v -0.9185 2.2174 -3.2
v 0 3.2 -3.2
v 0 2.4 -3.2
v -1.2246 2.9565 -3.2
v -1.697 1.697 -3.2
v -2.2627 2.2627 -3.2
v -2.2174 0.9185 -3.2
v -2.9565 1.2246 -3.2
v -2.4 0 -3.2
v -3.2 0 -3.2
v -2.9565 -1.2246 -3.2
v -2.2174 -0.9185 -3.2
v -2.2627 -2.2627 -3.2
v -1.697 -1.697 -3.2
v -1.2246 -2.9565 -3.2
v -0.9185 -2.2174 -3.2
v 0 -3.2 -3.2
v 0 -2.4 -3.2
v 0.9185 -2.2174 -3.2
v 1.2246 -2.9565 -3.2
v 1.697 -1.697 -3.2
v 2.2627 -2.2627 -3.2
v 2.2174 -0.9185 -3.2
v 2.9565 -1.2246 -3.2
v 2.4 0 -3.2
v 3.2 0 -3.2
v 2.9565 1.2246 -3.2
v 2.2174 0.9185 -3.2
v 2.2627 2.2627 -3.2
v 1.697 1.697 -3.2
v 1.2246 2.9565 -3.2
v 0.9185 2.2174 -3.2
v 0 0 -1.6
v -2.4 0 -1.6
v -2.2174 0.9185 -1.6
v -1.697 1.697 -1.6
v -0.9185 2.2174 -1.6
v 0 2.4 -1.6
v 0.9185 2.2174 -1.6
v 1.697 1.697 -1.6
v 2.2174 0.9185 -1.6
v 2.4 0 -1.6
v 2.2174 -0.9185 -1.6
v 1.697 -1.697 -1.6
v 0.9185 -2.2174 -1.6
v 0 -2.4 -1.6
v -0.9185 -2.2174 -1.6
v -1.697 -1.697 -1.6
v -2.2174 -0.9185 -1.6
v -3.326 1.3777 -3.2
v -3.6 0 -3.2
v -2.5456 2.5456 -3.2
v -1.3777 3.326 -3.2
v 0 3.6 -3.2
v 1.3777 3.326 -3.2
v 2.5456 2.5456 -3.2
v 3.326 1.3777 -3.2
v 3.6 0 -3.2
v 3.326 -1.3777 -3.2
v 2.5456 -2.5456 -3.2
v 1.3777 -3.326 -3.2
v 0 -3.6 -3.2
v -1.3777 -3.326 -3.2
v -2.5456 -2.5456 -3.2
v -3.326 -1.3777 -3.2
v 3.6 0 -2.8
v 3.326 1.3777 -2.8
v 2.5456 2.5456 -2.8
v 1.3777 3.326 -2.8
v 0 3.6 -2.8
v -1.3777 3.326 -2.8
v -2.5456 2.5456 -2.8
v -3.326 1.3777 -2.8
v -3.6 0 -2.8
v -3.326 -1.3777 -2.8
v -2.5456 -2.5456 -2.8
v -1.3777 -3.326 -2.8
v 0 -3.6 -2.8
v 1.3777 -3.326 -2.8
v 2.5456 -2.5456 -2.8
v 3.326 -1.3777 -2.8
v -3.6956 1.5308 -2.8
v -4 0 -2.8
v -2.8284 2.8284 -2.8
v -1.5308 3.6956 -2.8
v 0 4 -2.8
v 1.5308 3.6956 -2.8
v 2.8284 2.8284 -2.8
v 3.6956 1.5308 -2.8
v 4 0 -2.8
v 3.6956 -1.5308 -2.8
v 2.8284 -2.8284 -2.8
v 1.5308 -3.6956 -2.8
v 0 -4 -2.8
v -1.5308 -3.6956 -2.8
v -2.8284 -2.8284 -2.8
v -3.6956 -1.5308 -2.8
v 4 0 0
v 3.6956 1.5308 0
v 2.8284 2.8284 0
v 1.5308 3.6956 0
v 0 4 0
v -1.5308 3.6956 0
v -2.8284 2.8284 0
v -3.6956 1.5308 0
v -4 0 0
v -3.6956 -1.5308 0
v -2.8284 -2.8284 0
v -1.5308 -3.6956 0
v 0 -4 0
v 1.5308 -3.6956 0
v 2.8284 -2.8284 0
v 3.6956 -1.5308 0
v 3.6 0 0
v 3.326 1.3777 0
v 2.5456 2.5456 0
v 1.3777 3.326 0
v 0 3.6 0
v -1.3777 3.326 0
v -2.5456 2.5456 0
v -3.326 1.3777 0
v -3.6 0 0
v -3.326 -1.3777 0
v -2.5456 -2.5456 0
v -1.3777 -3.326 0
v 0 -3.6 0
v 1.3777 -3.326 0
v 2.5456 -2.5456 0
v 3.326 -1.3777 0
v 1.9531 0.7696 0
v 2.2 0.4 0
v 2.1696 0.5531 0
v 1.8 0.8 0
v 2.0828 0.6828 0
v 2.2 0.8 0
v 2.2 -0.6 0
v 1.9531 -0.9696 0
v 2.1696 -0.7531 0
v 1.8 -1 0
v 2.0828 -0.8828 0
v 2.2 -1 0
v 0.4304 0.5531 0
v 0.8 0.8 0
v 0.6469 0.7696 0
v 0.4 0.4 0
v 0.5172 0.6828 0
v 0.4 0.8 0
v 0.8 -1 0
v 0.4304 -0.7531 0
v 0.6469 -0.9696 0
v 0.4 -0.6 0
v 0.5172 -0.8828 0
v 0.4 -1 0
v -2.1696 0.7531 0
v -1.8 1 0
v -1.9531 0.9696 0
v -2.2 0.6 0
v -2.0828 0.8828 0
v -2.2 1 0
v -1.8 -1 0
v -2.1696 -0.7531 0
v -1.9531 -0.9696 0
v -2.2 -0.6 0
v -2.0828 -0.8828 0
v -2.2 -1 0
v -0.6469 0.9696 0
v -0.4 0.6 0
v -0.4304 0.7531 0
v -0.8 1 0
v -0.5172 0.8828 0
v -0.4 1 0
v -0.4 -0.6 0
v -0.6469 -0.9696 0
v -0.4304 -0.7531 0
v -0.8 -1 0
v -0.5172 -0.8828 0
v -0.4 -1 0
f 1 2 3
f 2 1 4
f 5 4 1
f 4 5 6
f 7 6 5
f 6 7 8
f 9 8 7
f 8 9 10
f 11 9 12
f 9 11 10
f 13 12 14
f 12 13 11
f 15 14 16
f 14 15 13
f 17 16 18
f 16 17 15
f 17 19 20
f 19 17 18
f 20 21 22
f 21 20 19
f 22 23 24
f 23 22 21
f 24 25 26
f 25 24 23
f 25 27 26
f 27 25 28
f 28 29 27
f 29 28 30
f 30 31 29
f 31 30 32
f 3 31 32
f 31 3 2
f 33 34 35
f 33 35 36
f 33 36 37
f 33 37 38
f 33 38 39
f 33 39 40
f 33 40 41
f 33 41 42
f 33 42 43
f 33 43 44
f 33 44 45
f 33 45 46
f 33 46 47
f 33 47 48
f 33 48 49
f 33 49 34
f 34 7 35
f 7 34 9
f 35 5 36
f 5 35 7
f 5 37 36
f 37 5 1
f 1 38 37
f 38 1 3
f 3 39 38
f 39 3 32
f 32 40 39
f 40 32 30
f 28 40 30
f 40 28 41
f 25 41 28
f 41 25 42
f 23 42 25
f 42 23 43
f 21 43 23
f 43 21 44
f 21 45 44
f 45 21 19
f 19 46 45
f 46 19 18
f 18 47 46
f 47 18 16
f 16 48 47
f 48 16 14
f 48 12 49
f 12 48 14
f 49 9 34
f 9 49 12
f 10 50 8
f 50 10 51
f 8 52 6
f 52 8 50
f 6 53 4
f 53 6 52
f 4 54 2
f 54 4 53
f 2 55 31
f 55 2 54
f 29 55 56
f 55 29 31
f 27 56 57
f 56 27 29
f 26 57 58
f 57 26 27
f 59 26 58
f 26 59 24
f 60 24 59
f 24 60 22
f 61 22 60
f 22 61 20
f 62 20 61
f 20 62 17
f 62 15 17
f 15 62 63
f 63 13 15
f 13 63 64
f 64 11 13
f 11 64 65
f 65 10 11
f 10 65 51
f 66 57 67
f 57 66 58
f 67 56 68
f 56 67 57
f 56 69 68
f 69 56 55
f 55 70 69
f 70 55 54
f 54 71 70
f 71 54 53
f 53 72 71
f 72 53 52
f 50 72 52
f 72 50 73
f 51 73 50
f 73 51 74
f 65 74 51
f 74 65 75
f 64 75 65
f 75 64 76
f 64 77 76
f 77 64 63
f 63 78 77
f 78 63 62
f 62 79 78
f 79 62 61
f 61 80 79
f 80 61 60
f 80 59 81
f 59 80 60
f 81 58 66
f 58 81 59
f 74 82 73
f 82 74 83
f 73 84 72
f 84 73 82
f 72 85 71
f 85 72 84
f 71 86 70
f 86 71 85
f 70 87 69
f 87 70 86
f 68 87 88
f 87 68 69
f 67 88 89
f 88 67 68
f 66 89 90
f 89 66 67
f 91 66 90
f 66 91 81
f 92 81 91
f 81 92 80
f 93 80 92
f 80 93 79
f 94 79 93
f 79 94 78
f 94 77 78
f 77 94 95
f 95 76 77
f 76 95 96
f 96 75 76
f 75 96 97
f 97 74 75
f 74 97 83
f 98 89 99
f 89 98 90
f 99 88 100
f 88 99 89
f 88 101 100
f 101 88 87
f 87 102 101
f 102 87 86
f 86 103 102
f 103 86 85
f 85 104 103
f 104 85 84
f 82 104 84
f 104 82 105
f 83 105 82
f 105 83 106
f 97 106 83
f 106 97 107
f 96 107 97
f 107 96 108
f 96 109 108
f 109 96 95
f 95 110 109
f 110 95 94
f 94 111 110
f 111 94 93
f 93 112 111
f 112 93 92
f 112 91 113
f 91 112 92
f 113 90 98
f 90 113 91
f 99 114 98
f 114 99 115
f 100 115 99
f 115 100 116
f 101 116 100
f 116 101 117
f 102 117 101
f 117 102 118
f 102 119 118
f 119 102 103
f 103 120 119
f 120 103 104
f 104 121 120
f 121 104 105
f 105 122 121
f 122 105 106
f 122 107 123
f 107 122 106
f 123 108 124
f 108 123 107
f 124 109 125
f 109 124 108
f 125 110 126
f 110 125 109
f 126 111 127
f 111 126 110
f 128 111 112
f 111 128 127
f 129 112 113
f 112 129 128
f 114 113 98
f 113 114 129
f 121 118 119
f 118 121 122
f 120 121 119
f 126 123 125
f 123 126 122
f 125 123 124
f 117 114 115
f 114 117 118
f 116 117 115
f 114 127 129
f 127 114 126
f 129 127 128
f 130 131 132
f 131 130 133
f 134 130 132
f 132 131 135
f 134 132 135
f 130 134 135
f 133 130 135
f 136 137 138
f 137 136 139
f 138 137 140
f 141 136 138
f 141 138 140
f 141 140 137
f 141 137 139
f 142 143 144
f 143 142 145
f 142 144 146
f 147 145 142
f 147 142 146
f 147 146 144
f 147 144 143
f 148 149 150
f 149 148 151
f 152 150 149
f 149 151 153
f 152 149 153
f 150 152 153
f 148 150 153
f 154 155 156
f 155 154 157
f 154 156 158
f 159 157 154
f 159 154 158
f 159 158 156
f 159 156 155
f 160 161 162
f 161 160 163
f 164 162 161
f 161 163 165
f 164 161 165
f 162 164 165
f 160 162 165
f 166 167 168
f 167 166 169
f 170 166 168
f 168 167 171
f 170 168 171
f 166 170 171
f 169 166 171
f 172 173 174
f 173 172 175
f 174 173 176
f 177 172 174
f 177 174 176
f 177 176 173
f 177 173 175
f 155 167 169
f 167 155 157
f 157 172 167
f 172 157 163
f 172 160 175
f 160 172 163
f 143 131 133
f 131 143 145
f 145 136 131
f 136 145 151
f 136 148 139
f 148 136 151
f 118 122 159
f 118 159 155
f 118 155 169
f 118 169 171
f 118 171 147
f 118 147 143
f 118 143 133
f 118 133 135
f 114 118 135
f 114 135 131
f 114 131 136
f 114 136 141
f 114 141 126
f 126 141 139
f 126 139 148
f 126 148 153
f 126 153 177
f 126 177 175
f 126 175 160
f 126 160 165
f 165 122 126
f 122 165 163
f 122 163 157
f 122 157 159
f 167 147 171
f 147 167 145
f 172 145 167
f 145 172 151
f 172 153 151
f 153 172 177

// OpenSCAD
// file: ../p/4-4disc.scad
use <../lib.scad>
function ldraw_lib__4_4disc() = [
// 0 Disc 1.0
// 0 Name: 4-4disc.dat
// 0 Author: James Jessiman
// 0 !LDRAW_ORG Primitive UPDATE 2002-02
// 0 !LICENSE Licensed under CC BY 2.0 and CC BY 4.0 : see CAreadme.txt
// 
// 0 BFC CERTIFY CCW
  [0,"BFC","CERTIFY"],
  [0,"BFC","CCW"],
// 
// 0 !HISTORY 1998-12-15 [PTadmin] Official Update 1998-10
// 0 !HISTORY 2002-03-23 [sbliss] Added BFC statement
// 0 !HISTORY 2002-04-25 [PTadmin] Official Update 2002-02
// 0 !HISTORY 2007-06-24 [PTadmin] Header formatted for Contributor Agreement
// 0 !HISTORY 2008-07-01 [PTadmin] Official Update 2008-01
// 
// 
// 3 16 0 0 0 1 0 0 0.9239 0 0.3827
  [3,16,0,0,0,1,0,0,0.9239,0,0.3827],
// 3 16 0 0 0 0.9239 0 0.3827 0.7071 0 0.7071
  [3,16,0,0,0,0.9239,0,0.3827,0.7071,0,0.7071],
// 3 16 0 0 0 0.7071 0 0.7071 0.3827 0 0.9239
  [3,16,0,0,0,0.7071,0,0.7071,0.3827,0,0.9239],
// 3 16 0 0 0 0.3827 0 0.9239 0 0 1
  [3,16,0,0,0,0.3827,0,0.9239,0,0,1],
// 3 16 0 0 0 0 0 1 -0.3827 0 0.9239
  [3,16,0,0,0,0,0,1,-0.3827,0,0.9239],
// 3 16 0 0 0 -0.3827 0 0.9239 -0.7071 0 0.7071
  [3,16,0,0,0,-0.3827,0,0.9239,-0.7071,0,0.7071],
// 3 16 0 0 0 -0.7071 0 0.7071 -0.9239 0 0.3827
  [3,16,0,0,0,-0.7071,0,0.7071,-0.9239,0,0.3827],
// 3 16 0 0 0 -0.9239 0 0.3827 -1 0 -0
  [3,16,0,0,0,-0.9239,0,0.3827,-1,0,-0],
// 3 16 0 0 0 -1 0 -0 -0.9239 0 -0.3827
  [3,16,0,0,0,-1,0,-0,-0.9239,0,-0.3827],
// 3 16 0 0 0 -0.9239 0 -0.3827 -0.7071 0 -0.7071
  [3,16,0,0,0,-0.9239,0,-0.3827,-0.7071,0,-0.7071],
// 3 16 0 0 0 -0.7071 0 -0.7071 -0.3827 0 -0.9239
  [3,16,0,0,0,-0.7071,0,-0.7071,-0.3827,0,-0.9239],
// 3 16 0 0 0 -0.3827 0 -0.9239 0 0 -1
  [3,16,0,0,0,-0.3827,0,-0.9239,0,0,-1],
// 3 16 0 0 0 0 0 -1 0.3827 0 -0.9239
  [3,16,0,0,0,0,0,-1,0.3827,0,-0.9239],
// 3 16 0 0 0 0.3827 0 -0.9239 0.7071 0 -0.7071
  [3,16,0,0,0,0.3827,0,-0.9239,0.7071,0,-0.7071],
// 3 16 0 0 0 0.7071 0 -0.7071 0.9239 0 -0.3827
  [3,16,0,0,0,0.7071,0,-0.7071,0.9239,0,-0.3827],
// 3 16 0 0 0 0.9239 0 -0.3827 1 0 0
  [3,16,0,0,0,0.9239,0,-0.3827,1,0,0],
// 0
];
makepoly(ldraw_lib__4_4disc(), line=0.2);
// file: ../p/4-4ring3.scad
use <../lib.scad>
function ldraw_lib__4_4ring3() = [
// 0 Ring  3 x 1.0
// 0 Name: 4-4ring3.dat
// 0 Author: James Jessiman
// 0 !LDRAW_ORG Primitive UPDATE 2009-01
// 0 !LICENSE Licensed under CC BY 2.0 and CC BY 4.0 : see CAreadme.txt
// 
// 0 BFC CERTIFY CCW
  [0,"BFC","CERTIFY"],
  [0,"BFC","CCW"],
// 
// 0 !HISTORY 1998-12-15 [PTadmin] Official Update 1998-10
// 0 !HISTORY 2002-04-05 [hafhead] Added BFC statement
// 0 !HISTORY 2002-04-25 [PTadmin] Official Update 2002-02
// 0 !HISTORY 2007-06-24 [PTadmin] Header formatted for Contributor Agreement
// 0 !HISTORY 2008-07-01 [PTadmin] Official Update 2008-01
// 0 !HISTORY 2008-08-26 [cwdee] Switch polygon winding and rename
// 0 !HISTORY 2009-05-02 [PTadmin] Official Update 2009-01
// 
// 
// 4 16 -1.5308 0 3.6956 -1.1481 0 2.7717 0 0 3 0 0 4
  [4,16,-1.5308,0,3.6956,-1.1481,0,2.7717,0,0,3,0,0,4],
// 4 16 -2.8284 0 2.8284 -2.1213 0 2.1213 -1.1481 0 2.7717 -1.5308 0 3.6956
  [4,16,-2.8284,0,2.8284,-2.1213,0,2.1213,-1.1481,0,2.7717,-1.5308,0,3.6956],
// 4 16 -3.6956 0 1.5308 -2.7717 0 1.1481 -2.1213 0 2.1213 -2.8284 0 2.8284
  [4,16,-3.6956,0,1.5308,-2.7717,0,1.1481,-2.1213,0,2.1213,-2.8284,0,2.8284],
// 4 16 -4 0 0 -3 0 0 -2.7717 0 1.1481 -3.6956 0 1.5308
  [4,16,-4,0,0,-3,0,0,-2.7717,0,1.1481,-3.6956,0,1.5308],
// 4 16 -3.6956 0 -1.5308 -2.7717 0 -1.1481 -3 0 0 -4 0 0
  [4,16,-3.6956,0,-1.5308,-2.7717,0,-1.1481,-3,0,0,-4,0,0],
// 4 16 -2.8284 0 -2.8284 -2.1213 0 -2.1213 -2.7717 0 -1.1481 -3.6956 0 -1.5308
  [4,16,-2.8284,0,-2.8284,-2.1213,0,-2.1213,-2.7717,0,-1.1481,-3.6956,0,-1.5308],
// 4 16 -1.5308 0 -3.6956 -1.1481 0 -2.7717 -2.1213 0 -2.1213 -2.8284 0 -2.8284
  [4,16,-1.5308,0,-3.6956,-1.1481,0,-2.7717,-2.1213,0,-2.1213,-2.8284,0,-2.8284],
// 4 16 0 0 -4 0 0 -3 -1.1481 0 -2.7717 -1.5308 0 -3.6956
  [4,16,0,0,-4,0,0,-3,-1.1481,0,-2.7717,-1.5308,0,-3.6956],
// 4 16 1.5308 0 -3.6956 1.1481 0 -2.7717 0 0 -3 0 0 -4
  [4,16,1.5308,0,-3.6956,1.1481,0,-2.7717,0,0,-3,0,0,-4],
// 4 16 2.8284 0 -2.8284 2.1213 0 -2.1213 1.1481 0 -2.7717 1.5308 0 -3.6956
  [4,16,2.8284,0,-2.8284,2.1213,0,-2.1213,1.1481,0,-2.7717,1.5308,0,-3.6956],
// 4 16 3.6956 0 -1.5308 2.7717 0 -1.1481 2.1213 0 -2.1213 2.8284 0 -2.8284
  [4,16,3.6956,0,-1.5308,2.7717,0,-1.1481,2.1213,0,-2.1213,2.8284,0,-2.8284],
// 4 16 4 0 0 3 0 0 2.7717 0 -1.1481 3.6956 0 -1.5308
  [4,16,4,0,0,3,0,0,2.7717,0,-1.1481,3.6956,0,-1.5308],
// 4 16 3.6956 0 1.5308 2.7717 0 1.1481 3 0 0 4 0 0
  [4,16,3.6956,0,1.5308,2.7717,0,1.1481,3,0,0,4,0,0],
// 4 16 2.8284 0 2.8284 2.1213 0 2.1213 2.7717 0 1.1481 3.6956 0 1.5308
  [4,16,2.8284,0,2.8284,2.1213,0,2.1213,2.7717,0,1.1481,3.6956,0,1.5308],
// 4 16 1.5308 0 3.6956 1.1481 0 2.7717 2.1213 0 2.1213 2.8284 0 2.8284
  [4,16,1.5308,0,3.6956,1.1481,0,2.7717,2.1213,0,2.1213,2.8284,0,2.8284],
// 4 16 0 0 4 0 0 3 1.1481 0 2.7717 1.5308 0 3.6956
  [4,16,0,0,4,0,0,3,1.1481,0,2.7717,1.5308,0,3.6956],
// 0
];
makepoly(ldraw_lib__4_4ring3(), line=0.2);
// file: ../p/4-4cylc.scad
use <../lib.scad>
use <4-4cyli.scad>
use <4-4disc.scad>
use <4-4edge.scad>
function ldraw_lib__4_4cylc() = [
// 0 Cylinder Closed 1.0
// 0 Name: 4-4cylc.dat
// 0 Author: Alex Taylor [anathema]
// 0 !LDRAW_ORG Primitive UPDATE 2009-02
// 0 !LICENSE Licensed under CC BY 2.0 and CC BY 4.0 : see CAreadme.txt
// 
// 0 BFC CERTIFY CCW
  [0,"BFC","CERTIFY"],
  [0,"BFC","CCW"],
// 
// 0 !HISTORY 2008-12-29 [cwdee] Removed one disc
// 0 !HISTORY 2009-09-03 [PTadmin] Official Update 2009-02
// 
// 
// 1 16 0 0 0 1 0 0 0 1 0 0 0 1 4-4edge.dat
  [1,16,0,0,0,1,0,0,0,1,0,0,0,1, ldraw_lib__4_4edge()],
// 1 16 0 1 0 1 0 0 0 1 0 0 0 1 4-4edge.dat
  [1,16,0,1,0,1,0,0,0,1,0,0,0,1, ldraw_lib__4_4edge()],
// 1 16 0 0 0 1 0 0 0 1 0 0 0 1 4-4disc.dat
  [1,16,0,0,0,1,0,0,0,1,0,0,0,1, ldraw_lib__4_4disc()],
// 1 16 0 0 0 1 0 0 0 1 0 0 0 1 4-4cyli.dat
  [1,16,0,0,0,1,0,0,0,1,0,0,0,1, ldraw_lib__4_4cyli()],
// 0
];
makepoly(ldraw_lib__4_4cylc(), line=0.2);
// file: ../p/4-4edge.scad
use <../lib.scad>
function ldraw_lib__4_4edge() = [
// 0 Circle 1.0
// 0 Name: 4-4edge.dat
// 0 Author: James Jessiman
// 0 !LDRAW_ORG Primitive UPDATE 2017-01
// 0 !LICENSE Licensed under CC BY 2.0 and CC BY 4.0 : see CAreadme.txt
// 
// 0 BFC CERTIFY CCW
  [0,"BFC","CERTIFY"],
  [0,"BFC","CCW"],
// 
// 0 !HISTORY 1998-12-15 [PTadmin] Official Update 1998-10
// 0 !HISTORY 2005-12-28 [PTadmin] Official Update 2005-01
// 0 !HISTORY 2007-06-24 [PTadmin] Header formatted for Contributor Agreement
// 0 !HISTORY 2008-07-01 [PTadmin] Official Update 2008-01
// 0 !HISTORY 2017-01-15 [Steffen] BFCed
// 0 !HISTORY 2017-12-30 [PTadmin] Official Update 2017-01
// 
// 
// 2 24 1 0 0 0.9239 0 0.3827
  [2,24,1,0,0,0.9239,0,0.3827],
// 2 24 0.9239 0 0.3827 0.7071 0 0.7071
  [2,24,0.9239,0,0.3827,0.7071,0,0.7071],
// 2 24 0.7071 0 0.7071 0.3827 0 0.9239
  [2,24,0.7071,0,0.7071,0.3827,0,0.9239],
// 2 24 0.3827 0 0.9239 0 0 1
  [2,24,0.3827,0,0.9239,0,0,1],
// 2 24 0 0 1 -0.3827 0 0.9239
  [2,24,0,0,1,-0.3827,0,0.9239],
// 2 24 -0.3827 0 0.9239 -0.7071 0 0.7071
  [2,24,-0.3827,0,0.9239,-0.7071,0,0.7071],
// 2 24 -0.7071 0 0.7071 -0.9239 0 0.3827
  [2,24,-0.7071,0,0.7071,-0.9239,0,0.3827],
// 2 24 -0.9239 0 0.3827 -1 0 -0
  [2,24,-0.9239,0,0.3827,-1,0,-0],
// 2 24 -1 0 -0 -0.9239 0 -0.3827
  [2,24,-1,0,-0,-0.9239,0,-0.3827],
// 2 24 -0.9239 0 -0.3827 -0.7071 0 -0.7071
  [2,24,-0.9239,0,-0.3827,-0.7071,0,-0.7071],
// 2 24 -0.7071 0 -0.7071 -0.3827 0 -0.9239
  [2,24,-0.7071,0,-0.7071,-0.3827,0,-0.9239],
// 2 24 -0.3827 0 -0.9239 0 0 -1
  [2,24,-0.3827,0,-0.9239,0,0,-1],
// 2 24 0 0 -1 0.3827 0 -0.9239
  [2,24,0,0,-1,0.3827,0,-0.9239],
// 2 24 0.3827 0 -0.9239 0.7071 0 -0.7071
  [2,24,0.3827,0,-0.9239,0.7071,0,-0.7071],
// 2 24 0.7071 0 -0.7071 0.9239 0 -0.3827
  [2,24,0.7071,0,-0.7071,0.9239,0,-0.3827],
// 2 24 0.9239 0 -0.3827 1 0 0
  [2,24,0.9239,0,-0.3827,1,0,0],
];
makepoly(ldraw_lib__4_4edge(), line=0.2);
// file: ../p/4-4cyli.scad
use <../lib.scad>
function ldraw_lib__4_4cyli() = [
// 0 Cylinder 1.0
// 0 Name: 4-4cyli.dat
// 0 Author: James Jessiman
// 0 !LDRAW_ORG Primitive UPDATE 2005-01
// 0 !LICENSE Licensed under CC BY 2.0 and CC BY 4.0 : see CAreadme.txt
// 
// 0 BFC CERTIFY CCW
  [0,"BFC","CERTIFY"],
  [0,"BFC","CCW"],
// 
// 0 !HISTORY 1998-12-15 [PTadmin] Official Update 1998-10
// 0 !HISTORY 2002-03-23 [sbliss] Added BFC statement; merged headers from files in distributions LDraw 0.27 and Complete.
// 0 !HISTORY 2002-04-25 [PTadmin] Official Update 2002-02
// 0 !HISTORY 2004-12-14 [guyvivan] BFC CCW
// 0 !HISTORY 2005-12-28 [PTadmin] Official Update 2005-01
// 0 !HISTORY 2007-06-24 [PTadmin] Header formatted for Contributor Agreement
// 0 !HISTORY 2008-07-01 [PTadmin] Official Update 2008-01
// 
// 
// 4 16 1 1 0 0.9239 1 0.3827 0.9239 0 0.3827 1 0 0
  [4,16,1,1,0,0.9239,1,0.3827,0.9239,0,0.3827,1,0,0],
// 5 24 1 0 0 1 1 0 0.9239 0 0.3827 0.9239 0 -0.3827
  [5,24,1,0,0,1,1,0,0.9239,0,0.3827,0.9239,0,-0.3827],
// 4 16 0.9239 1 0.3827 0.7071 1 0.7071 0.7071 0 0.7071 0.9239 0 0.3827
  [4,16,0.9239,1,0.3827,0.7071,1,0.7071,0.7071,0,0.7071,0.9239,0,0.3827],
// 5 24 0.9239 0 0.3827 0.9239 1 0.3827 0.7071 0 0.7071 1 0 0
  [5,24,0.9239,0,0.3827,0.9239,1,0.3827,0.7071,0,0.7071,1,0,0],
// 4 16 0.7071 1 0.7071 0.3827 1 0.9239 0.3827 0 0.9239 0.7071 0 0.7071
  [4,16,0.7071,1,0.7071,0.3827,1,0.9239,0.3827,0,0.9239,0.7071,0,0.7071],
// 5 24 0.7071 0 0.7071 0.7071 1 0.7071 0.3827 0 0.9239 0.9239 0 0.3827
  [5,24,0.7071,0,0.7071,0.7071,1,0.7071,0.3827,0,0.9239,0.9239,0,0.3827],
// 4 16 0.3827 1 0.9239 0 1 1 0 0 1 0.3827 0 0.9239
  [4,16,0.3827,1,0.9239,0,1,1,0,0,1,0.3827,0,0.9239],
// 5 24 0.3827 0 0.9239 0.3827 1 0.9239 0 0 1 0.7071 0 0.7071
  [5,24,0.3827,0,0.9239,0.3827,1,0.9239,0,0,1,0.7071,0,0.7071],
// 4 16 0 1 1 -0.3827 1 0.9239 -0.3827 0 0.9239 0 0 1
  [4,16,0,1,1,-0.3827,1,0.9239,-0.3827,0,0.9239,0,0,1],
// 5 24 0 0 1 0 1 1 -0.3827 0 0.9239 0.3827 0 0.9239
  [5,24,0,0,1,0,1,1,-0.3827,0,0.9239,0.3827,0,0.9239],
// 4 16 -0.3827 1 0.9239 -0.7071 1 0.7071 -0.7071 0 0.7071 -0.3827 0 0.9239
  [4,16,-0.3827,1,0.9239,-0.7071,1,0.7071,-0.7071,0,0.7071,-0.3827,0,0.9239],
// 5 24 -0.3827 0 0.9239 -0.3827 1 0.9239 -0.7071 0 0.7071 0 0 1
  [5,24,-0.3827,0,0.9239,-0.3827,1,0.9239,-0.7071,0,0.7071,0,0,1],
// 4 16 -0.7071 1 0.7071 -0.9239 1 0.3827 -0.9239 0 0.3827 -0.7071 0 0.7071
  [4,16,-0.7071,1,0.7071,-0.9239,1,0.3827,-0.9239,0,0.3827,-0.7071,0,0.7071],
// 5 24 -0.7071 0 0.7071 -0.7071 1 0.7071 -0.9239 0 0.3827 -0.3827 0 0.9239
  [5,24,-0.7071,0,0.7071,-0.7071,1,0.7071,-0.9239,0,0.3827,-0.3827,0,0.9239],
// 4 16 -0.9239 1 0.3827 -1 1 0 -1 0 0 -0.9239 0 0.3827
  [4,16,-0.9239,1,0.3827,-1,1,0,-1,0,0,-0.9239,0,0.3827],
// 5 24 -0.9239 0 0.3827 -0.9239 1 0.3827 -1 0 0 -0.7071 0 0.7071
  [5,24,-0.9239,0,0.3827,-0.9239,1,0.3827,-1,0,0,-0.7071,0,0.7071],
// 4 16 -1 1 0 -0.9239 1 -0.3827 -0.9239 0 -0.3827 -1 0 0
  [4,16,-1,1,0,-0.9239,1,-0.3827,-0.9239,0,-0.3827,-1,0,0],
// 5 24 -1 0 0 -1 1 0 -0.9239 0 -0.3827 -0.9239 0 0.3827
  [5,24,-1,0,0,-1,1,0,-0.9239,0,-0.3827,-0.9239,0,0.3827],
// 4 16 -0.9239 1 -0.3827 -0.7071 1 -0.7071 -0.7071 0 -0.7071 -0.9239 0 -0.3827
  [4,16,-0.9239,1,-0.3827,-0.7071,1,-0.7071,-0.7071,0,-0.7071,-0.9239,0,-0.3827],
// 5 24 -0.9239 0 -0.3827 -0.9239 1 -0.3827 -0.7071 0 -0.7071 -1 0 0
  [5,24,-0.9239,0,-0.3827,-0.9239,1,-0.3827,-0.7071,0,-0.7071,-1,0,0],
// 4 16 -0.7071 1 -0.7071 -0.3827 1 -0.9239 -0.3827 0 -0.9239 -0.7071 0 -0.7071
  [4,16,-0.7071,1,-0.7071,-0.3827,1,-0.9239,-0.3827,0,-0.9239,-0.7071,0,-0.7071],
// 5 24 -0.7071 0 -0.7071 -0.7071 1 -0.7071 -0.3827 0 -0.9239 -0.9239 0 -0.3827
  [5,24,-0.7071,0,-0.7071,-0.7071,1,-0.7071,-0.3827,0,-0.9239,-0.9239,0,-0.3827],
// 4 16 -0.3827 1 -0.9239 0 1 -1 0 0 -1 -0.3827 0 -0.9239
  [4,16,-0.3827,1,-0.9239,0,1,-1,0,0,-1,-0.3827,0,-0.9239],
// 5 24 -0.3827 0 -0.9239 -0.3827 1 -0.9239 0 0 -1 -0.7071 0 -0.7071
  [5,24,-0.3827,0,-0.9239,-0.3827,1,-0.9239,0,0,-1,-0.7071,0,-0.7071],
// 4 16 0 1 -1 0.3827 1 -0.9239 0.3827 0 -0.9239 0 0 -1
  [4,16,0,1,-1,0.3827,1,-0.9239,0.3827,0,-0.9239,0,0,-1],
// 5 24 0 0 -1 0 1 -1 0.3827 0 -0.9239 -0.3827 0 -0.9239
  [5,24,0,0,-1,0,1,-1,0.3827,0,-0.9239,-0.3827,0,-0.9239],
// 4 16 0.3827 1 -0.9239 0.7071 1 -0.7071 0.7071 0 -0.7071 0.3827 0 -0.9239
  [4,16,0.3827,1,-0.9239,0.7071,1,-0.7071,0.7071,0,-0.7071,0.3827,0,-0.9239],
// 5 24 0.3827 0 -0.9239 0.3827 1 -0.9239 0.7071 0 -0.7071 0 0 -1
  [5,24,0.3827,0,-0.9239,0.3827,1,-0.9239,0.7071,0,-0.7071,0,0,-1],
// 4 16 0.7071 1 -0.7071 0.9239 1 -0.3827 0.9239 0 -0.3827 0.7071 0 -0.7071
  [4,16,0.7071,1,-0.7071,0.9239,1,-0.3827,0.9239,0,-0.3827,0.7071,0,-0.7071],
// 5 24 0.7071 0 -0.7071 0.7071 1 -0.7071 0.9239 0 -0.3827 0.3827 0 -0.9239
  [5,24,0.7071,0,-0.7071,0.7071,1,-0.7071,0.9239,0,-0.3827,0.3827,0,-0.9239],
// 4 16 0.9239 1 -0.3827 1 1 0 1 0 0 0.9239 0 -0.3827
  [4,16,0.9239,1,-0.3827,1,1,0,1,0,0,0.9239,0,-0.3827],
// 5 24 0.9239 0 -0.3827 0.9239 1 -0.3827 1 0 0 0.7071 0 -0.7071
  [5,24,0.9239,0,-0.3827,0.9239,1,-0.3827,1,0,0,0.7071,0,-0.7071],
// 0
];
makepoly(ldraw_lib__4_4cyli(), line=0.2);
// file: ../p/stud4o.scad
use <../lib.scad>
use <4-4cylc.scad>
use <4-4ring3.scad>
function ldraw_lib__stud4o() = [
// 0 Stud Tube Open without Outer Cylinder
// 0 Name: stud4o.dat
// 0 Author: Magnus Forsberg [MagFors]
// 0 !LDRAW_ORG Primitive UPDATE 2011-02
// 0 !LICENSE Licensed under CC BY 2.0 and CC BY 4.0 : see CAreadme.txt
// 
// 0 !HELP This stud is a "antistud" to be used like a underside stud,
// 0 !HELP but without the outer cylinder.
// 0 !HELP 1 47 0 0 0 1 0 0 0 1 0 0 0 1 stud4.dat
// 
// 0 BFC CERTIFY CCW
  [0,"BFC","CERTIFY"],
  [0,"BFC","CCW"],
// 
// 0 !HISTORY 2011-12-29 [PTadmin] Official Update 2011-02
// 
// 
// 1 16 0 -4 0 2 0 0 0 1 0 0 0 2 4-4ring3.dat
  [1,16,0,-4,0,2,0,0,0,1,0,0,0,2, ldraw_lib__4_4ring3()],
// 0 BFC INVERTNEXT
  [0,"BFC","INVERTNEXT"],
// 1 16 0 0 0 -6 0 0 0 -4 0 0 0 6 4-4cylc.dat
  [1,16,0,0,0,-6,0,0,0,-4,0,0,0,6, ldraw_lib__4_4cylc()],
];
makepoly(ldraw_lib__stud4o(), line=0.2);
// file: ../p/4-4ring8.scad
use <../lib.scad>
function ldraw_lib__4_4ring8() = [
// 0 Ring  8 x 1.0
// 0 Name: 4-4ring8.dat
// 0 Author: Steffen [Steffen]
// 0 !LDRAW_ORG Primitive UPDATE 2012-01
// 0 !LICENSE Licensed under CC BY 2.0 and CC BY 4.0 : see CAreadme.txt
// 
// 0 BFC CERTIFY CCW
  [0,"BFC","CERTIFY"],
  [0,"BFC","CCW"],
// 
// 0 !HISTORY 2003-12-19 [PTadmin] Official Update 2003-03
// 0 !HISTORY 2007-06-24 [PTadmin] Header formatted for Contributor Agreement
// 0 !HISTORY 2008-07-01 [PTadmin] Official Update 2008-01
// 0 !HISTORY 2012-02-16 [Philo] Changed to CCW
// 0 !HISTORY 2012-03-30 [PTadmin] Official Update 2012-01
// 
// 
// 4 16 9 0 0 8.3151 0 3.4443 7.3912 0 3.0616 8 0 0
  [4,16,9,0,0,8.3151,0,3.4443,7.3912,0,3.0616,8,0,0],
// 4 16 8.3151 0 3.4443 6.3639 0 6.3639 5.6568 0 5.6568 7.3912 0 3.0616
  [4,16,8.3151,0,3.4443,6.3639,0,6.3639,5.6568,0,5.6568,7.3912,0,3.0616],
// 4 16 6.3639 0 6.3639 3.4443 0 8.3151 3.0616 0 7.3912 5.6568 0 5.6568
  [4,16,6.3639,0,6.3639,3.4443,0,8.3151,3.0616,0,7.3912,5.6568,0,5.6568],
// 4 16 3.4443 0 8.3151 0 0 9 0 0 8 3.0616 0 7.3912
  [4,16,3.4443,0,8.3151,0,0,9,0,0,8,3.0616,0,7.3912],
// 4 16 0 0 9 -3.4443 0 8.3151 -3.0616 0 7.3912 0 0 8
  [4,16,0,0,9,-3.4443,0,8.3151,-3.0616,0,7.3912,0,0,8],
// 4 16 -3.4443 0 8.3151 -6.3639 0 6.3639 -5.6568 0 5.6568 -3.0616 0 7.3912
  [4,16,-3.4443,0,8.3151,-6.3639,0,6.3639,-5.6568,0,5.6568,-3.0616,0,7.3912],
// 4 16 -6.3639 0 6.3639 -8.3151 0 3.4443 -7.3912 0 3.0616 -5.6568 0 5.6568
  [4,16,-6.3639,0,6.3639,-8.3151,0,3.4443,-7.3912,0,3.0616,-5.6568,0,5.6568],
// 4 16 -8.3151 0 3.4443 -9 0 0 -8 0 0 -7.3912 0 3.0616
  [4,16,-8.3151,0,3.4443,-9,0,0,-8,0,0,-7.3912,0,3.0616],
// 4 16 -9 0 0 -8.3151 0 -3.4443 -7.3912 0 -3.0616 -8 0 0
  [4,16,-9,0,0,-8.3151,0,-3.4443,-7.3912,0,-3.0616,-8,0,0],
// 4 16 -8.3151 0 -3.4443 -6.3639 0 -6.3639 -5.6568 0 -5.6568 -7.3912 0 -3.0616
  [4,16,-8.3151,0,-3.4443,-6.3639,0,-6.3639,-5.6568,0,-5.6568,-7.3912,0,-3.0616],
// 4 16 -6.3639 0 -6.3639 -3.4443 0 -8.3151 -3.0616 0 -7.3912 -5.6568 0 -5.6568
  [4,16,-6.3639,0,-6.3639,-3.4443,0,-8.3151,-3.0616,0,-7.3912,-5.6568,0,-5.6568],
// 4 16 -3.4443 0 -8.3151 0 0 -9 0 0 -8 -3.0616 0 -7.3912
  [4,16,-3.4443,0,-8.3151,0,0,-9,0,0,-8,-3.0616,0,-7.3912],
// 4 16 0 0 -9 3.4443 0 -8.3151 3.0616 0 -7.3912 0 0 -8
  [4,16,0,0,-9,3.4443,0,-8.3151,3.0616,0,-7.3912,0,0,-8],
// 4 16 3.4443 0 -8.3151 6.3639 0 -6.3639 5.6568 0 -5.6568 3.0616 0 -7.3912
  [4,16,3.4443,0,-8.3151,6.3639,0,-6.3639,5.6568,0,-5.6568,3.0616,0,-7.3912],
// 4 16 6.3639 0 -6.3639 8.3151 0 -3.4443 7.3912 0 -3.0616 5.6568 0 -5.6568
  [4,16,6.3639,0,-6.3639,8.3151,0,-3.4443,7.3912,0,-3.0616,5.6568,0,-5.6568],
// 4 16 8.3151 0 -3.4443 9 0 0 8 0 0 7.3912 0 -3.0616
  [4,16,8.3151,0,-3.4443,9,0,0,8,0,0,7.3912,0,-3.0616],
];
makepoly(ldraw_lib__4_4ring8(), line=0.2);
// file: ../p/4-4cylo.scad
use <../lib.scad>
use <4-4cyli.scad>
use <4-4edge.scad>
function ldraw_lib__4_4cylo() = [
// 0 Cylinder Open 1.0
// 0 Name: 4-4cylo.dat
// 0 Author: Mark Kennedy [mkennedy]
// 0 !LDRAW_ORG Primitive UPDATE 2010-01
// 0 !LICENSE Licensed under CC BY 2.0 and CC BY 4.0 : see CAreadme.txt
// 
// 0 BFC CERTIFY CCW
  [0,"BFC","CERTIFY"],
  [0,"BFC","CCW"],
// 
// 0 !HISTORY 2010-04-05 [PTadmin] Official Update 2010-01
// 
// 
// 1 16 0 0 0 1 0 0 0 1 0 0 0 1 4-4edge.dat
  [1,16,0,0,0,1,0,0,0,1,0,0,0,1, ldraw_lib__4_4edge()],
// 1 16 0 1 0 1 0 0 0 1 0 0 0 1 4-4edge.dat
  [1,16,0,1,0,1,0,0,0,1,0,0,0,1, ldraw_lib__4_4edge()],
// 1 16 0 0 0 1 0 0 0 1 0 0 0 1 4-4cyli.dat
  [1,16,0,0,0,1,0,0,0,1,0,0,0,1, ldraw_lib__4_4cyli()],
// 0
];
makepoly(ldraw_lib__4_4cylo(), line=0.2);
// file: s/98138s02.scad
use <../../lib.scad>
use <../../p/4-4cylo.scad>
use <../../p/4-4ring8.scad>
use <../../p/4-4ring9.scad>
use <../../p/stud4o.scad>
function ldraw_lib__s__98138s02() = [
// 0 ~Tile  1 x  1 Round with Groove without Complete Top Face
// 0 Name: s\98138s02.dat
// 0 Author: Magnus Forsberg [MagFors]
// 0 !LDRAW_ORG Subpart UPDATE 2020-01
// 0 !LICENSE Licensed under CC BY 2.0 and CC BY 4.0 : see CAreadme.txt
// 
// 0 BFC CERTIFY CCW
  [0,"BFC","CERTIFY"],
  [0,"BFC","CCW"],
// 
// 0 !HISTORY 2020-06-28 [PTadmin] Official Update 2020-01
// 
// 
// 1 16 0 4 0 1 0 0 0 -1 0 0 0 1 stud4o.dat
  [1,16,0,4,0,1,0,0,0,-1,0,0,0,1, ldraw_lib__stud4o()],
// 1 16 0 8 0 -1 0 0 0 -1 0 0 0 1 4-4ring8.dat
  [1,16,0,8,0,-1,0,0,0,-1,0,0,0,1, ldraw_lib__4_4ring8()],
// 1 16 0 7 0 9 0 0 0 1 0 0 0 9 4-4cylo.dat
  [1,16,0,7,0,9,0,0,0,1,0,0,0,9, ldraw_lib__4_4cylo()],
// 1 16 0 7 0 -1 0 0 0 -1 0 0 0 1 4-4ring9.dat
  [1,16,0,7,0,-1,0,0,0,-1,0,0,0,1, ldraw_lib__4_4ring9()],
// 1 16 0 0 0 10 0 0 0 7 0 0 0 10 4-4cylo.dat
  [1,16,0,0,0,10,0,0,0,7,0,0,0,10, ldraw_lib__4_4cylo()],
];
makepoly(ldraw_lib__s__98138s02(), line=0.2);
// file: ../p/4-4ring9.scad
use <../lib.scad>
function ldraw_lib__4_4ring9() = [
// 0 Ring  9 x 1.0
// 0 Name: 4-4ring9.dat
// 0 Author: John Riley [jriley]
// 0 !LDRAW_ORG Primitive UPDATE 2004-02
// 0 !LICENSE Licensed under CC BY 2.0 and CC BY 4.0 : see CAreadme.txt
// 
// 0 BFC CERTIFY CCW
  [0,"BFC","CERTIFY"],
  [0,"BFC","CCW"],
// 
// 0 !HISTORY 2004-04-22 [PTadmin] Official Update 2004-02
// 0 !HISTORY 2007-06-24 [PTadmin] Header formatted for Contributor Agreement
// 0 !HISTORY 2008-07-01 [PTadmin] Official Update 2008-01
// 
// 
// 4 16 9 0 0 10 0 0 9.239 0 3.827 8.3151 0 3.4443
  [4,16,9,0,0,10,0,0,9.239,0,3.827,8.3151,0,3.4443],
// 4 16 8.3151 0 3.4443 9.239 0 3.827 7.071 0 7.071 6.3639 0 6.3639
  [4,16,8.3151,0,3.4443,9.239,0,3.827,7.071,0,7.071,6.3639,0,6.3639],
// 4 16 6.3639 0 6.3639 7.071 0 7.071 3.827 0 9.239 3.4443 0 8.3151
  [4,16,6.3639,0,6.3639,7.071,0,7.071,3.827,0,9.239,3.4443,0,8.3151],
// 4 16 3.4443 0 8.3151 3.827 0 9.239 0 0 10 0 0 9
  [4,16,3.4443,0,8.3151,3.827,0,9.239,0,0,10,0,0,9],
// 4 16 0 0 9 0 0 10 -3.827 0 9.239 -3.4443 0 8.3151
  [4,16,0,0,9,0,0,10,-3.827,0,9.239,-3.4443,0,8.3151],
// 4 16 -3.4443 0 8.3151 -3.827 0 9.239 -7.071 0 7.071 -6.3639 0 6.3639
  [4,16,-3.4443,0,8.3151,-3.827,0,9.239,-7.071,0,7.071,-6.3639,0,6.3639],
// 4 16 -6.3639 0 6.3639 -7.071 0 7.071 -9.239 0 3.827 -8.3151 0 3.4443
  [4,16,-6.3639,0,6.3639,-7.071,0,7.071,-9.239,0,3.827,-8.3151,0,3.4443],
// 4 16 -8.3151 0 3.4443 -9.239 0 3.827 -10 0 0 -9 0 0
  [4,16,-8.3151,0,3.4443,-9.239,0,3.827,-10,0,0,-9,0,0],
// 4 16 -9 0 0 -10 0 0 -9.239 0 -3.827 -8.3151 0 -3.4443
  [4,16,-9,0,0,-10,0,0,-9.239,0,-3.827,-8.3151,0,-3.4443],
// 4 16 -8.3151 0 -3.4443 -9.239 0 -3.827 -7.071 0 -7.071 -6.3639 0 -6.3639
  [4,16,-8.3151,0,-3.4443,-9.239,0,-3.827,-7.071,0,-7.071,-6.3639,0,-6.3639],
// 4 16 -6.3639 0 -6.3639 -7.071 0 -7.071 -3.827 0 -9.239 -3.4443 0 -8.3151
  [4,16,-6.3639,0,-6.3639,-7.071,0,-7.071,-3.827,0,-9.239,-3.4443,0,-8.3151],
// 4 16 -3.4443 0 -8.3151 -3.827 0 -9.239 0 0 -10 0 0 -9
  [4,16,-3.4443,0,-8.3151,-3.827,0,-9.239,0,0,-10,0,0,-9],
// 4 16 0 0 -9 0 0 -10 3.827 0 -9.239 3.4443 0 -8.3151
  [4,16,0,0,-9,0,0,-10,3.827,0,-9.239,3.4443,0,-8.3151],
// 4 16 3.4443 0 -8.3151 3.827 0 -9.239 7.071 0 -7.071 6.3639 0 -6.3639
  [4,16,3.4443,0,-8.3151,3.827,0,-9.239,7.071,0,-7.071,6.3639,0,-6.3639],
// 4 16 6.3639 0 -6.3639 7.071 0 -7.071 9.239 0 -3.827 8.3151 0 -3.4443
  [4,16,6.3639,0,-6.3639,7.071,0,-7.071,9.239,0,-3.827,8.3151,0,-3.4443],
// 4 16 8.3151 0 -3.4443 9.239 0 -3.827 10 0 0 9 0 0
  [4,16,8.3151,0,-3.4443,9.239,0,-3.827,10,0,0,9,0,0],
// 0
];
makepoly(ldraw_lib__4_4ring9(), line=0.2);
// file: ../p/1-4ndis.scad
use <../lib.scad>
function ldraw_lib__1_4ndis() = [
// 0 Disc Negative 0.25
// 0 Name: 1-4ndis.dat
// 0 Author: James Jessiman
// 0 !LDRAW_ORG Primitive UPDATE 2012-01
// 0 !LICENSE Licensed under CC BY 2.0 and CC BY 4.0 : see CAreadme.txt
// 
// 0 BFC CERTIFY CCW
  [0,"BFC","CERTIFY"],
  [0,"BFC","CCW"],
// 
// 0 !HISTORY 2002-03-23 [sbliss] Added BFC Statement
// 0 !HISTORY 2002-04-25 [PTadmin] Official Update 2002-02
// 0 !HISTORY 2007-06-22 [PTadmin] Header formatted for Contributor Agreement
// 0 !HISTORY 2008-07-01 [PTadmin] Official Update 2008-01
// 0 !HISTORY 2012-02-16 [Philo] Changed to CCW
// 0 !HISTORY 2012-03-30 [PTadmin] Official Update 2012-01
// 
// 
// 3 16 0.9239 0 0.3827 1 0 0 1 0 1
  [3,16,0.9239,0,0.3827,1,0,0,1,0,1],
// 3 16 0.7071 0 0.7071 0.9239 0 0.3827 1 0 1
  [3,16,0.7071,0,0.7071,0.9239,0,0.3827,1,0,1],
// 3 16 0.3827 0 0.9239 0.7071 0 0.7071 1 0 1
  [3,16,0.3827,0,0.9239,0.7071,0,0.7071,1,0,1],
// 3 16 0 0 1 0.3827 0 0.9239 1 0 1
  [3,16,0,0,1,0.3827,0,0.9239,1,0,1],
];
makepoly(ldraw_lib__1_4ndis(), line=0.2);
// file: ../p/1-4chrd.scad
use <../lib.scad>
function ldraw_lib__1_4chrd() = [
// 0 Chord 0.25
// 0 Name: 1-4chrd.dat
// 0 Author: Tony Hafner [hafhead]
// 0 !LDRAW_ORG Primitive UPDATE 2012-02
// 0 !LICENSE Licensed under CC BY 2.0 and CC BY 4.0 : see CAreadme.txt
// 
// 0 BFC CERTIFY CCW
  [0,"BFC","CERTIFY"],
  [0,"BFC","CCW"],
// 
// 0 !HISTORY 2004-04-22 [PTadmin] Official Update 2004-02
// 0 !HISTORY 2007-10-09 [PTadmin] Header formatted for Contributor Agreement
// 0 !HISTORY 2008-07-01 [PTadmin] Official Update 2008-01
// 0 !HISTORY 2012-08-02 [MMR1988] Re-creation with PrimGen2 and Rectifier
// 0 !HISTORY 2012-08-09 [PTadmin] Official Update 2012-02
// 
// 
// 4 16 0.9239 0 0.3827 0.3827 0 0.9239 0 0 1 1 0 0
  [4,16,0.9239,0,0.3827,0.3827,0,0.9239,0,0,1,1,0,0],
// 3 16 0.7071 0 0.7071 0.3827 0 0.9239 0.9239 0 0.3827
  [3,16,0.7071,0,0.7071,0.3827,0,0.9239,0.9239,0,0.3827],
];
makepoly(ldraw_lib__1_4chrd(), line=0.2);
// main file
use <../lib.scad>
use <../p/1-4chrd.scad>
use <../p/1-4ndis.scad>
use <../p/4-4ring9.scad>
use <s/98138s02.scad>
function ldraw_lib__98138p8d() = [
// 0 Tile  1 x  1 Round with Medium Azure Eyes on Dark Blue Background Pattern
// 0 Name: 98138p8d.dat
// 0 Author: Vincent Messenet [Cheenzo]
// 0 !LDRAW_ORG Part UPDATE 2020-03
// 0 !LICENSE Licensed under CC BY 2.0 and CC BY 4.0 : see CAreadme.txt
// 
// 0 BFC CERTIFY CCW
  [0,"BFC","CERTIFY"],
  [0,"BFC","CCW"],
// 
// 0 !KEYWORDS Bricklink 98138pb108, Set 60227, Set 60228, Set 60229
// 
// 0 !HISTORY 2020-12-29 [PTadmin] Official Update 2020-03
// 
// 
// 1 16 0 0 0 1 0 0 0 1 0 0 0 1 s\98138s02.dat
  [1,16,0,0,0,1,0,0,0,1,0,0,0,1, ldraw_lib__s__98138s02()],
// 1 16 0 0 0 1 0 0 0 1 0 0 0 1 4-4ring9.dat
  [1,16,0,0,0,1,0,0,0,1,0,0,0,1, ldraw_lib__4_4ring9()],
// 1 272 0 0 0 0 0 -9 0 1 0 9 0 0 1-4chrd.dat
  [1,272,0,0,0,0,0,-9,0,1,0,9,0,0, ldraw_lib__1_4chrd()],
// 1 272 0 0 0 0 0 -9 0 1 0 -9 0 0 1-4chrd.dat
  [1,272,0,0,0,0,0,-9,0,1,0,-9,0,0, ldraw_lib__1_4chrd()],
// 1 272 0 0 0 9 0 0 0 1 0 0 0 9 1-4chrd.dat
  [1,272,0,0,0,9,0,0,0,1,0,0,0,9, ldraw_lib__1_4chrd()],
// 1 272 0 0 0 9 0 0 0 1 0 0 0 -9 1-4chrd.dat
  [1,272,0,0,0,9,0,0,0,1,0,0,0,-9, ldraw_lib__1_4chrd()],
// 1 322 4.5 0 1 1 0 0 0 1 0 0 0 1 1-4chrd.dat
  [1,322,4.5,0,1,1,0,0,0,1,0,0,0,1, ldraw_lib__1_4chrd()],
// 1 272 4.5 0 1 1 0 0 0 1 0 0 0 1 1-4ndis.dat
  [1,272,4.5,0,1,1,0,0,0,1,0,0,0,1, ldraw_lib__1_4ndis()],
// 1 322 4.5 0 -1.5 1 0 0 0 1 0 0 0 -1 1-4chrd.dat
  [1,322,4.5,0,-1.5,1,0,0,0,1,0,0,0,-1, ldraw_lib__1_4chrd()],
// 1 272 4.5 0 -1.5 1 0 0 0 1 0 0 0 -1 1-4ndis.dat
  [1,272,4.5,0,-1.5,1,0,0,0,1,0,0,0,-1, ldraw_lib__1_4ndis()],
// 1 322 2 0 1 -1 0 0 0 1 0 0 0 1 1-4chrd.dat
  [1,322,2,0,1,-1,0,0,0,1,0,0,0,1, ldraw_lib__1_4chrd()],
// 1 272 2 0 1 -1 0 0 0 1 0 0 0 1 1-4ndis.dat
  [1,272,2,0,1,-1,0,0,0,1,0,0,0,1, ldraw_lib__1_4ndis()],
// 1 322 2 0 -1.5 -1 0 0 0 1 0 0 0 -1 1-4chrd.dat
  [1,322,2,0,-1.5,-1,0,0,0,1,0,0,0,-1, ldraw_lib__1_4chrd()],
// 1 272 2 0 -1.5 -1 0 0 0 1 0 0 0 -1 1-4ndis.dat
  [1,272,2,0,-1.5,-1,0,0,0,1,0,0,0,-1, ldraw_lib__1_4ndis()],
// 1 322 -4.5 0 1.5 -1 0 0 0 1 0 0 0 1 1-4chrd.dat
  [1,322,-4.5,0,1.5,-1,0,0,0,1,0,0,0,1, ldraw_lib__1_4chrd()],
// 1 272 -4.5 0 1.5 -1 0 0 0 1 0 0 0 1 1-4ndis.dat
  [1,272,-4.5,0,1.5,-1,0,0,0,1,0,0,0,1, ldraw_lib__1_4ndis()],
// 1 322 -4.5 0 -1.5 -1 0 0 0 1 0 0 0 -1 1-4chrd.dat
  [1,322,-4.5,0,-1.5,-1,0,0,0,1,0,0,0,-1, ldraw_lib__1_4chrd()],
// 1 272 -4.5 0 -1.5 -1 0 0 0 1 0 0 0 -1 1-4ndis.dat
  [1,272,-4.5,0,-1.5,-1,0,0,0,1,0,0,0,-1, ldraw_lib__1_4ndis()],
// 1 322 -2 0 1.5 1 0 0 0 1 0 0 0 1 1-4chrd.dat
  [1,322,-2,0,1.5,1,0,0,0,1,0,0,0,1, ldraw_lib__1_4chrd()],
// 1 272 -2 0 1.5 1 0 0 0 1 0 0 0 1 1-4ndis.dat
  [1,272,-2,0,1.5,1,0,0,0,1,0,0,0,1, ldraw_lib__1_4ndis()],
// 1 322 -2 0 -1.5 1 0 0 0 1 0 0 0 -1 1-4chrd.dat
  [1,322,-2,0,-1.5,1,0,0,0,1,0,0,0,-1, ldraw_lib__1_4chrd()],
// 1 272 -2 0 -1.5 1 0 0 0 1 0 0 0 -1 1-4ndis.dat
  [1,272,-2,0,-1.5,1,0,0,0,1,0,0,0,-1, ldraw_lib__1_4ndis()],
// 4 322 -1 0 1.5 -2 0 2.5 -4.5 0 2.5 -5.5 0 1.5
  [4,322,-1,0,1.5,-2,0,2.5,-4.5,0,2.5,-5.5,0,1.5],
// 4 322 -1 0 -1.5 -1 0 1.5 -5.5 0 1.5 -5.5 0 -1.5
  [4,322,-1,0,-1.5,-1,0,1.5,-5.5,0,1.5,-5.5,0,-1.5],
// 4 322 -2 0 -2.5 -1 0 -1.5 -5.5 0 -1.5 -4.5 0 -2.5
  [4,322,-2,0,-2.5,-1,0,-1.5,-5.5,0,-1.5,-4.5,0,-2.5],
// 4 322 2 0 2 1 0 1 5.5 0 1 4.5 0 2
  [4,322,2,0,2,1,0,1,5.5,0,1,4.5,0,2],
// 4 322 5.5 0 -1.5 5.5 0 1 1 0 1 1 0 -1.5
  [4,322,5.5,0,-1.5,5.5,0,1,1,0,1,1,0,-1.5],
// 4 322 4.5 0 -2.5 5.5 0 -1.5 1 0 -1.5 2 0 -2.5
  [4,322,4.5,0,-2.5,5.5,0,-1.5,1,0,-1.5,2,0,-2.5],
// 3 272 0 0 9 -9 0 0 -5.5 0 2.5
  [3,272,0,0,9,-9,0,0,-5.5,0,2.5],
// 3 272 0 0 9 -5.5 0 2.5 -4.5 0 2.5
  [3,272,0,0,9,-5.5,0,2.5,-4.5,0,2.5],
// 3 272 0 0 9 -4.5 0 2.5 -2 0 2.5
  [3,272,0,0,9,-4.5,0,2.5,-2,0,2.5],
// 3 272 0 0 9 -2 0 2.5 -1 0 2.5
  [3,272,0,0,9,-2,0,2.5,-1,0,2.5],
// 3 272 0 0 9 -1 0 2.5 1 0 2
  [3,272,0,0,9,-1,0,2.5,1,0,2],
// 3 272 0 0 9 1 0 2 2 0 2
  [3,272,0,0,9,1,0,2,2,0,2],
// 3 272 0 0 9 2 0 2 4.5 0 2
  [3,272,0,0,9,2,0,2,4.5,0,2],
// 3 272 0 0 9 4.5 0 2 5.5 0 2
  [3,272,0,0,9,4.5,0,2,5.5,0,2],
// 3 272 9 0 0 0 0 9 5.5 0 2
  [3,272,9,0,0,0,0,9,5.5,0,2],
// 3 272 9 0 0 5.5 0 2 5.5 0 1
  [3,272,9,0,0,5.5,0,2,5.5,0,1],
// 3 272 9 0 0 5.5 0 1 5.5 0 -1.5
  [3,272,9,0,0,5.5,0,1,5.5,0,-1.5],
// 3 272 9 0 0 5.5 0 -1.5 5.5 0 -2.5
  [3,272,9,0,0,5.5,0,-1.5,5.5,0,-2.5],
// 3 272 9 0 0 5.5 0 -2.5 0 0 -9
  [3,272,9,0,0,5.5,0,-2.5,0,0,-9],
// 3 272 0 0 -9 5.5 0 -2.5 4.5 0 -2.5
  [3,272,0,0,-9,5.5,0,-2.5,4.5,0,-2.5],
// 3 272 0 0 -9 4.5 0 -2.5 2 0 -2.5
  [3,272,0,0,-9,4.5,0,-2.5,2,0,-2.5],
// 3 272 0 0 -9 2 0 -2.5 1 0 -2.5
  [3,272,0,0,-9,2,0,-2.5,1,0,-2.5],
// 3 272 0 0 -9 1 0 -2.5 -1 0 -2.5
  [3,272,0,0,-9,1,0,-2.5,-1,0,-2.5],
// 3 272 0 0 -9 -1 0 -2.5 -2 0 -2.5
  [3,272,0,0,-9,-1,0,-2.5,-2,0,-2.5],
// 3 272 0 0 -9 -2 0 -2.5 -4.5 0 -2.5
  [3,272,0,0,-9,-2,0,-2.5,-4.5,0,-2.5],
// 3 272 0 0 -9 -4.5 0 -2.5 -5.5 0 -2.5
  [3,272,0,0,-9,-4.5,0,-2.5,-5.5,0,-2.5],
// 3 272 -5.5 0 -2.5 -9 0 0 0 0 -9
  [3,272,-5.5,0,-2.5,-9,0,0,0,0,-9],
// 3 272 -9 0 0 -5.5 0 -2.5 -5.5 0 -1.5
  [3,272,-9,0,0,-5.5,0,-2.5,-5.5,0,-1.5],
// 3 272 -9 0 0 -5.5 0 -1.5 -5.5 0 1.5
  [3,272,-9,0,0,-5.5,0,-1.5,-5.5,0,1.5],
// 3 272 -9 0 0 -5.5 0 1.5 -5.5 0 2.5
  [3,272,-9,0,0,-5.5,0,1.5,-5.5,0,2.5],
// 4 272 -1 0 2.5 -1 0 1.5 1 0 1 1 0 2
  [4,272,-1,0,2.5,-1,0,1.5,1,0,1,1,0,2],
// 4 272 1 0 -1.5 1 0 1 -1 0 1.5 -1 0 -1.5
  [4,272,1,0,-1.5,1,0,1,-1,0,1.5,-1,0,-1.5],
// 4 272 1 0 -2.5 1 0 -1.5 -1 0 -1.5 -1 0 -2.5
  [4,272,1,0,-2.5,1,0,-1.5,-1,0,-1.5,-1,0,-2.5],
];
makepoly(ldraw_lib__98138p8d(), line=0.2);
